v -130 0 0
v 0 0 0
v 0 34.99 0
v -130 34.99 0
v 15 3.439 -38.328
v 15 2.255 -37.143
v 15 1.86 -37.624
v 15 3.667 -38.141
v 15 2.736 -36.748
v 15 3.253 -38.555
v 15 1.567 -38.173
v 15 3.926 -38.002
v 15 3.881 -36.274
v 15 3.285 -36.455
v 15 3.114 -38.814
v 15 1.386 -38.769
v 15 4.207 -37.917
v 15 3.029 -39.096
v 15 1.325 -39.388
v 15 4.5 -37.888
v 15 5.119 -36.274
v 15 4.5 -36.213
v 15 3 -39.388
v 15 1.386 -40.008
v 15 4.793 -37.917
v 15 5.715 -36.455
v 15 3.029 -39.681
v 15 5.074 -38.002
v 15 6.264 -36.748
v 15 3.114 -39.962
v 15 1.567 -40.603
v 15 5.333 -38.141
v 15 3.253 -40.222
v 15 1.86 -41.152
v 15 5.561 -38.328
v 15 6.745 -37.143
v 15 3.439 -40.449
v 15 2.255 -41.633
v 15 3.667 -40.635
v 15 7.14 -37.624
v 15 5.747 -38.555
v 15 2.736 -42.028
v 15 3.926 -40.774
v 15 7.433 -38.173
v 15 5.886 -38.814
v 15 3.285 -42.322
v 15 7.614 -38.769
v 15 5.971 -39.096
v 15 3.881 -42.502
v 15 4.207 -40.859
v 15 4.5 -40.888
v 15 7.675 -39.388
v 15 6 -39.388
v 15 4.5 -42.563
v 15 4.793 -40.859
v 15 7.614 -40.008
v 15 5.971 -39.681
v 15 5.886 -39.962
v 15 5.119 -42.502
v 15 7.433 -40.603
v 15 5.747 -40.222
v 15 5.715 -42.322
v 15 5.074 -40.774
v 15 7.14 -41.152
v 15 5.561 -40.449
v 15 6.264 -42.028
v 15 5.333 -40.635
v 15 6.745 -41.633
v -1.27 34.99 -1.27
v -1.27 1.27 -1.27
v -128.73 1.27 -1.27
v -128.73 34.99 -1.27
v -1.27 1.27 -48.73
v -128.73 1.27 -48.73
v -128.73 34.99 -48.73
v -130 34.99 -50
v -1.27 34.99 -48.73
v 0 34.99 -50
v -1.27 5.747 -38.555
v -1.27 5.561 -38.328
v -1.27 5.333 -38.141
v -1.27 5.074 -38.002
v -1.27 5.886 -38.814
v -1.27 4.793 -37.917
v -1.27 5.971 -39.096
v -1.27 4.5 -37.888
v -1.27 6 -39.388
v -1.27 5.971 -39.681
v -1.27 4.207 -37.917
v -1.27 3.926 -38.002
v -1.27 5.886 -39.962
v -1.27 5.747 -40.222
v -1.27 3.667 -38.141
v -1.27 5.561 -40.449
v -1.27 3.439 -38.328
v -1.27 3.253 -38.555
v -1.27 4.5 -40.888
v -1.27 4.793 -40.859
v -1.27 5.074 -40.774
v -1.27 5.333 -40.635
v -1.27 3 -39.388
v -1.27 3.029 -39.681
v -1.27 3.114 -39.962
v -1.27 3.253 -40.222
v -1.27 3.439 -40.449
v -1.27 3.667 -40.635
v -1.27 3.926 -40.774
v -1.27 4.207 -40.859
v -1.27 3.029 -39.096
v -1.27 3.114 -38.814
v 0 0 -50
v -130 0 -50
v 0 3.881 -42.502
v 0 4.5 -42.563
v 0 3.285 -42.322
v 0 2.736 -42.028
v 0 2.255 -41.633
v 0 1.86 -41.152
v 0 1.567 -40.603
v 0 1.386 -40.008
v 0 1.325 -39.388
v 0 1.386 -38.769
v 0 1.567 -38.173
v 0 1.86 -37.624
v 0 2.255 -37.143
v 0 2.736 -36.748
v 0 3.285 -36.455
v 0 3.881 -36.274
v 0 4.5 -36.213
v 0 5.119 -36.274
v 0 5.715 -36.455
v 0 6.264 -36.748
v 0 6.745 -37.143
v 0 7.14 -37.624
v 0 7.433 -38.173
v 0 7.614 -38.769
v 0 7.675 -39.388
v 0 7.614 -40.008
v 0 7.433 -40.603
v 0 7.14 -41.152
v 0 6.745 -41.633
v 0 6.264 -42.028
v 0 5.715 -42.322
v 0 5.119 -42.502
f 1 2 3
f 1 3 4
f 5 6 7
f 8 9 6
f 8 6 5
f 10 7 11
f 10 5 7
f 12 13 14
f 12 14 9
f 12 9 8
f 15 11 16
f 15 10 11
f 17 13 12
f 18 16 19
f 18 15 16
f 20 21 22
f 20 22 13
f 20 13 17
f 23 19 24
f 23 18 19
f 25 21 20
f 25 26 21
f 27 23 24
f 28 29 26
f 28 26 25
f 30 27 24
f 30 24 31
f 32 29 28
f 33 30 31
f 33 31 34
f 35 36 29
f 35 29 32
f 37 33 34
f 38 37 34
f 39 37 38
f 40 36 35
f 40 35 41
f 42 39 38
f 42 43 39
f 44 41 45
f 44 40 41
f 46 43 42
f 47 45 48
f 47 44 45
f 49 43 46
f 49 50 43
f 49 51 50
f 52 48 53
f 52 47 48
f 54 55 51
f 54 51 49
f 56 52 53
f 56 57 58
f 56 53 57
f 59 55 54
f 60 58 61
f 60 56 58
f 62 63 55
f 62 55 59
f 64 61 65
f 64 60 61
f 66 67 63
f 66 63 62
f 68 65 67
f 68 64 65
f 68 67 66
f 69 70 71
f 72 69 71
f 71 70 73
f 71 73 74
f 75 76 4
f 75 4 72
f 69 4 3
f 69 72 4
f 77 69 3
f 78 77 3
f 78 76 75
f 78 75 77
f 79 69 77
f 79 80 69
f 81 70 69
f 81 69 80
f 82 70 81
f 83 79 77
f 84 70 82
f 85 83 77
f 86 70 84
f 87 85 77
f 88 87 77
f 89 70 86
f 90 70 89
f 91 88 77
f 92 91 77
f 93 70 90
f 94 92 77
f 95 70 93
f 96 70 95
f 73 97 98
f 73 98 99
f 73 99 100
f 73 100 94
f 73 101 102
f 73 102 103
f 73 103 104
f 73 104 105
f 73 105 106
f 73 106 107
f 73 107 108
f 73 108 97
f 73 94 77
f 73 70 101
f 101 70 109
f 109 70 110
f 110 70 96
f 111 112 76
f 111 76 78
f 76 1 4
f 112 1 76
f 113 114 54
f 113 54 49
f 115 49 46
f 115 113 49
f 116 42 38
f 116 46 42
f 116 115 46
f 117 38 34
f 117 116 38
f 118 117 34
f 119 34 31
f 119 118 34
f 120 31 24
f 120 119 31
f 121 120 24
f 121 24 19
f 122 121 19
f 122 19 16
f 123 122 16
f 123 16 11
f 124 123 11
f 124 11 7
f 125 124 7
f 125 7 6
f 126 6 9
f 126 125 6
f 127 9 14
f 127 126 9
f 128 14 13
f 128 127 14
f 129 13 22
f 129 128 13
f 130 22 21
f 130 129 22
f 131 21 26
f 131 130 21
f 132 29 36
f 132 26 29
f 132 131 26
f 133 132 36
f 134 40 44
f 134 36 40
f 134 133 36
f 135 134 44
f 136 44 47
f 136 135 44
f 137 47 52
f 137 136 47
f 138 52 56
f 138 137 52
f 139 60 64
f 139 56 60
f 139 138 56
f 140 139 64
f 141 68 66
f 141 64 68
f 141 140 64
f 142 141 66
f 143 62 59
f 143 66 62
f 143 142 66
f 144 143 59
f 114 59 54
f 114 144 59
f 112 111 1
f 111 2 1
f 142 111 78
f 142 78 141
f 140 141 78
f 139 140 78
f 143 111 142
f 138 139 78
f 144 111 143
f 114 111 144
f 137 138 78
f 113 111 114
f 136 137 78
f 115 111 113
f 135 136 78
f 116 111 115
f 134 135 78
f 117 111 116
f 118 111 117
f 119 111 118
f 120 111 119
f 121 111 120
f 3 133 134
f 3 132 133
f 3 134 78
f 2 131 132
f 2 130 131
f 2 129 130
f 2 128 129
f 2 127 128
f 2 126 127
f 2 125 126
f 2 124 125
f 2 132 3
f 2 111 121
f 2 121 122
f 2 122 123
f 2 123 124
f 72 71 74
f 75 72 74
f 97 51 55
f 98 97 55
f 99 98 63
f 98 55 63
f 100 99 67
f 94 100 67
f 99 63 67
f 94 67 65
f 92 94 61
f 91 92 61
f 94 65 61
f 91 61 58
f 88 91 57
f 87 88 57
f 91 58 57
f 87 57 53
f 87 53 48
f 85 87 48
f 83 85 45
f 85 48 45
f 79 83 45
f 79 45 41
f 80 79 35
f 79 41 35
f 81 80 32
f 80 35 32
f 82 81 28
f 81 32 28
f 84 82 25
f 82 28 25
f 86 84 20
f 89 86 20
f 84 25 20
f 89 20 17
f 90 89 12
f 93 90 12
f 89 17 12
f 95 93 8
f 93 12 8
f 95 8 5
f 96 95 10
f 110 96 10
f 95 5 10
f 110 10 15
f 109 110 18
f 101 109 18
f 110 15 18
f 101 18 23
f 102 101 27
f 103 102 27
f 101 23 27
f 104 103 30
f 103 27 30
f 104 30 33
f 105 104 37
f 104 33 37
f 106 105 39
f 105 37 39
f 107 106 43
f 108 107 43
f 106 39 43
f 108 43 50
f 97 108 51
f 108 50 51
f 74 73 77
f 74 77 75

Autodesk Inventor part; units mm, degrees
ref_plane "YZ Plane" through (0, 0, 0) normal (1, 0, 0) x (0, 1, 0)
ref_plane "XZ Plane" through (0, 0, 0) normal (0, 1, 0) x (-1, 0, 0)
ref_plane "XY Plane" through (0, 0, 0) normal (0, 0, 1) x (1, 0, 0)
sketch "Sketch1" plane through (0, 0, 0) normal (0, 1, 0) x (-1, 0, 0)
  line L0 (0, 0) -> (130, 0)
  line L1 (130, 0) -> (130, -50)
  line L2 (130, -50) -> (0, -50)
  line L3 (0, -50) -> (0, 0)
  dimension "d0" = 130
  dimension "d1" = 50
extrude "Extrusion1" add sketch "Sketch1" along normal blind 1.27
sketch "Sketch2" plane through (0, 1.27, 0) normal (0, 1, 0) x (1, 0, 0)
  line L0 (-130, 0) -> (0, 0) projected
  line L1 (0, 0) -> (0, 50) projected
  line L2 (-130, 0) -> (0, 0)
  line L3 (0, 0) -> (0, 1.27)
  line L4 (0, 1.27) -> (-130, 1.27)
  line L5 (-130, 1.27) -> (-130, 0)
  line L6 (-130, 50) -> (-130, 0) projected
  line L7 (-130, 50) -> (0, 50)
  line L8 (0, 50) -> (0, 48.73)
  line L9 (0, 48.73) -> (-130, 48.73)
  line L10 (-130, 48.73) -> (-130, 50)
  line L11 (0, 1.27) -> (-1.27, 1.27)
  line L12 (-1.27, 1.27) -> (-1.27, 48.73)
  line L13 (-1.27, 48.73) -> (0, 48.73)
  line L14 (0, 48.73) -> (0, 1.27)
  line L15 (-130, 1.27) -> (-128.73, 1.27)
  line L16 (-128.73, 1.27) -> (-128.73, 48.73)
  line L17 (-128.73, 48.73) -> (-130, 48.73)
  line L18 (-130, 48.73) -> (-130, 1.27)
  dimension "d4" = 1.27
  dimension "d5" = 1.27
  dimension "d6" = 1.27
  dimension "d7" = 1.27
extrude "Extrusion2" add sketch "Sketch2" along normal blind 33.72 contours L5 L4 L1 L0 | L6 L9 L16 L4 | L4 L12 L9 L1 | L6 L7 L1 L9
sketch "Sketch3" plane through (0, 0, 0) normal (1, 0, 0) x (0, 0, -1)
  circle A0 centre (39.3882, 4.5) radius 3.175
  line L0 (50, 0) -> (0, 0) projected
  dimension "d10" = 6.35
  dimension "d17" = 4.5
extrude "Extrusion3" add sketch "Sketch3" along normal blind 15
sketch "Sketch4" plane through (15, 4.5, -39.3882) normal (1, 0, 0) x (0, 0, -1)
  circle A0 centre (0, 0) radius 1.5
  point P0 (-39.3882, -4.5)
  dimension "d14" = 3
extrude "Extrusion4" cut sketch "Sketch4" against normal blind 30
properties part number "CajaDesague"
